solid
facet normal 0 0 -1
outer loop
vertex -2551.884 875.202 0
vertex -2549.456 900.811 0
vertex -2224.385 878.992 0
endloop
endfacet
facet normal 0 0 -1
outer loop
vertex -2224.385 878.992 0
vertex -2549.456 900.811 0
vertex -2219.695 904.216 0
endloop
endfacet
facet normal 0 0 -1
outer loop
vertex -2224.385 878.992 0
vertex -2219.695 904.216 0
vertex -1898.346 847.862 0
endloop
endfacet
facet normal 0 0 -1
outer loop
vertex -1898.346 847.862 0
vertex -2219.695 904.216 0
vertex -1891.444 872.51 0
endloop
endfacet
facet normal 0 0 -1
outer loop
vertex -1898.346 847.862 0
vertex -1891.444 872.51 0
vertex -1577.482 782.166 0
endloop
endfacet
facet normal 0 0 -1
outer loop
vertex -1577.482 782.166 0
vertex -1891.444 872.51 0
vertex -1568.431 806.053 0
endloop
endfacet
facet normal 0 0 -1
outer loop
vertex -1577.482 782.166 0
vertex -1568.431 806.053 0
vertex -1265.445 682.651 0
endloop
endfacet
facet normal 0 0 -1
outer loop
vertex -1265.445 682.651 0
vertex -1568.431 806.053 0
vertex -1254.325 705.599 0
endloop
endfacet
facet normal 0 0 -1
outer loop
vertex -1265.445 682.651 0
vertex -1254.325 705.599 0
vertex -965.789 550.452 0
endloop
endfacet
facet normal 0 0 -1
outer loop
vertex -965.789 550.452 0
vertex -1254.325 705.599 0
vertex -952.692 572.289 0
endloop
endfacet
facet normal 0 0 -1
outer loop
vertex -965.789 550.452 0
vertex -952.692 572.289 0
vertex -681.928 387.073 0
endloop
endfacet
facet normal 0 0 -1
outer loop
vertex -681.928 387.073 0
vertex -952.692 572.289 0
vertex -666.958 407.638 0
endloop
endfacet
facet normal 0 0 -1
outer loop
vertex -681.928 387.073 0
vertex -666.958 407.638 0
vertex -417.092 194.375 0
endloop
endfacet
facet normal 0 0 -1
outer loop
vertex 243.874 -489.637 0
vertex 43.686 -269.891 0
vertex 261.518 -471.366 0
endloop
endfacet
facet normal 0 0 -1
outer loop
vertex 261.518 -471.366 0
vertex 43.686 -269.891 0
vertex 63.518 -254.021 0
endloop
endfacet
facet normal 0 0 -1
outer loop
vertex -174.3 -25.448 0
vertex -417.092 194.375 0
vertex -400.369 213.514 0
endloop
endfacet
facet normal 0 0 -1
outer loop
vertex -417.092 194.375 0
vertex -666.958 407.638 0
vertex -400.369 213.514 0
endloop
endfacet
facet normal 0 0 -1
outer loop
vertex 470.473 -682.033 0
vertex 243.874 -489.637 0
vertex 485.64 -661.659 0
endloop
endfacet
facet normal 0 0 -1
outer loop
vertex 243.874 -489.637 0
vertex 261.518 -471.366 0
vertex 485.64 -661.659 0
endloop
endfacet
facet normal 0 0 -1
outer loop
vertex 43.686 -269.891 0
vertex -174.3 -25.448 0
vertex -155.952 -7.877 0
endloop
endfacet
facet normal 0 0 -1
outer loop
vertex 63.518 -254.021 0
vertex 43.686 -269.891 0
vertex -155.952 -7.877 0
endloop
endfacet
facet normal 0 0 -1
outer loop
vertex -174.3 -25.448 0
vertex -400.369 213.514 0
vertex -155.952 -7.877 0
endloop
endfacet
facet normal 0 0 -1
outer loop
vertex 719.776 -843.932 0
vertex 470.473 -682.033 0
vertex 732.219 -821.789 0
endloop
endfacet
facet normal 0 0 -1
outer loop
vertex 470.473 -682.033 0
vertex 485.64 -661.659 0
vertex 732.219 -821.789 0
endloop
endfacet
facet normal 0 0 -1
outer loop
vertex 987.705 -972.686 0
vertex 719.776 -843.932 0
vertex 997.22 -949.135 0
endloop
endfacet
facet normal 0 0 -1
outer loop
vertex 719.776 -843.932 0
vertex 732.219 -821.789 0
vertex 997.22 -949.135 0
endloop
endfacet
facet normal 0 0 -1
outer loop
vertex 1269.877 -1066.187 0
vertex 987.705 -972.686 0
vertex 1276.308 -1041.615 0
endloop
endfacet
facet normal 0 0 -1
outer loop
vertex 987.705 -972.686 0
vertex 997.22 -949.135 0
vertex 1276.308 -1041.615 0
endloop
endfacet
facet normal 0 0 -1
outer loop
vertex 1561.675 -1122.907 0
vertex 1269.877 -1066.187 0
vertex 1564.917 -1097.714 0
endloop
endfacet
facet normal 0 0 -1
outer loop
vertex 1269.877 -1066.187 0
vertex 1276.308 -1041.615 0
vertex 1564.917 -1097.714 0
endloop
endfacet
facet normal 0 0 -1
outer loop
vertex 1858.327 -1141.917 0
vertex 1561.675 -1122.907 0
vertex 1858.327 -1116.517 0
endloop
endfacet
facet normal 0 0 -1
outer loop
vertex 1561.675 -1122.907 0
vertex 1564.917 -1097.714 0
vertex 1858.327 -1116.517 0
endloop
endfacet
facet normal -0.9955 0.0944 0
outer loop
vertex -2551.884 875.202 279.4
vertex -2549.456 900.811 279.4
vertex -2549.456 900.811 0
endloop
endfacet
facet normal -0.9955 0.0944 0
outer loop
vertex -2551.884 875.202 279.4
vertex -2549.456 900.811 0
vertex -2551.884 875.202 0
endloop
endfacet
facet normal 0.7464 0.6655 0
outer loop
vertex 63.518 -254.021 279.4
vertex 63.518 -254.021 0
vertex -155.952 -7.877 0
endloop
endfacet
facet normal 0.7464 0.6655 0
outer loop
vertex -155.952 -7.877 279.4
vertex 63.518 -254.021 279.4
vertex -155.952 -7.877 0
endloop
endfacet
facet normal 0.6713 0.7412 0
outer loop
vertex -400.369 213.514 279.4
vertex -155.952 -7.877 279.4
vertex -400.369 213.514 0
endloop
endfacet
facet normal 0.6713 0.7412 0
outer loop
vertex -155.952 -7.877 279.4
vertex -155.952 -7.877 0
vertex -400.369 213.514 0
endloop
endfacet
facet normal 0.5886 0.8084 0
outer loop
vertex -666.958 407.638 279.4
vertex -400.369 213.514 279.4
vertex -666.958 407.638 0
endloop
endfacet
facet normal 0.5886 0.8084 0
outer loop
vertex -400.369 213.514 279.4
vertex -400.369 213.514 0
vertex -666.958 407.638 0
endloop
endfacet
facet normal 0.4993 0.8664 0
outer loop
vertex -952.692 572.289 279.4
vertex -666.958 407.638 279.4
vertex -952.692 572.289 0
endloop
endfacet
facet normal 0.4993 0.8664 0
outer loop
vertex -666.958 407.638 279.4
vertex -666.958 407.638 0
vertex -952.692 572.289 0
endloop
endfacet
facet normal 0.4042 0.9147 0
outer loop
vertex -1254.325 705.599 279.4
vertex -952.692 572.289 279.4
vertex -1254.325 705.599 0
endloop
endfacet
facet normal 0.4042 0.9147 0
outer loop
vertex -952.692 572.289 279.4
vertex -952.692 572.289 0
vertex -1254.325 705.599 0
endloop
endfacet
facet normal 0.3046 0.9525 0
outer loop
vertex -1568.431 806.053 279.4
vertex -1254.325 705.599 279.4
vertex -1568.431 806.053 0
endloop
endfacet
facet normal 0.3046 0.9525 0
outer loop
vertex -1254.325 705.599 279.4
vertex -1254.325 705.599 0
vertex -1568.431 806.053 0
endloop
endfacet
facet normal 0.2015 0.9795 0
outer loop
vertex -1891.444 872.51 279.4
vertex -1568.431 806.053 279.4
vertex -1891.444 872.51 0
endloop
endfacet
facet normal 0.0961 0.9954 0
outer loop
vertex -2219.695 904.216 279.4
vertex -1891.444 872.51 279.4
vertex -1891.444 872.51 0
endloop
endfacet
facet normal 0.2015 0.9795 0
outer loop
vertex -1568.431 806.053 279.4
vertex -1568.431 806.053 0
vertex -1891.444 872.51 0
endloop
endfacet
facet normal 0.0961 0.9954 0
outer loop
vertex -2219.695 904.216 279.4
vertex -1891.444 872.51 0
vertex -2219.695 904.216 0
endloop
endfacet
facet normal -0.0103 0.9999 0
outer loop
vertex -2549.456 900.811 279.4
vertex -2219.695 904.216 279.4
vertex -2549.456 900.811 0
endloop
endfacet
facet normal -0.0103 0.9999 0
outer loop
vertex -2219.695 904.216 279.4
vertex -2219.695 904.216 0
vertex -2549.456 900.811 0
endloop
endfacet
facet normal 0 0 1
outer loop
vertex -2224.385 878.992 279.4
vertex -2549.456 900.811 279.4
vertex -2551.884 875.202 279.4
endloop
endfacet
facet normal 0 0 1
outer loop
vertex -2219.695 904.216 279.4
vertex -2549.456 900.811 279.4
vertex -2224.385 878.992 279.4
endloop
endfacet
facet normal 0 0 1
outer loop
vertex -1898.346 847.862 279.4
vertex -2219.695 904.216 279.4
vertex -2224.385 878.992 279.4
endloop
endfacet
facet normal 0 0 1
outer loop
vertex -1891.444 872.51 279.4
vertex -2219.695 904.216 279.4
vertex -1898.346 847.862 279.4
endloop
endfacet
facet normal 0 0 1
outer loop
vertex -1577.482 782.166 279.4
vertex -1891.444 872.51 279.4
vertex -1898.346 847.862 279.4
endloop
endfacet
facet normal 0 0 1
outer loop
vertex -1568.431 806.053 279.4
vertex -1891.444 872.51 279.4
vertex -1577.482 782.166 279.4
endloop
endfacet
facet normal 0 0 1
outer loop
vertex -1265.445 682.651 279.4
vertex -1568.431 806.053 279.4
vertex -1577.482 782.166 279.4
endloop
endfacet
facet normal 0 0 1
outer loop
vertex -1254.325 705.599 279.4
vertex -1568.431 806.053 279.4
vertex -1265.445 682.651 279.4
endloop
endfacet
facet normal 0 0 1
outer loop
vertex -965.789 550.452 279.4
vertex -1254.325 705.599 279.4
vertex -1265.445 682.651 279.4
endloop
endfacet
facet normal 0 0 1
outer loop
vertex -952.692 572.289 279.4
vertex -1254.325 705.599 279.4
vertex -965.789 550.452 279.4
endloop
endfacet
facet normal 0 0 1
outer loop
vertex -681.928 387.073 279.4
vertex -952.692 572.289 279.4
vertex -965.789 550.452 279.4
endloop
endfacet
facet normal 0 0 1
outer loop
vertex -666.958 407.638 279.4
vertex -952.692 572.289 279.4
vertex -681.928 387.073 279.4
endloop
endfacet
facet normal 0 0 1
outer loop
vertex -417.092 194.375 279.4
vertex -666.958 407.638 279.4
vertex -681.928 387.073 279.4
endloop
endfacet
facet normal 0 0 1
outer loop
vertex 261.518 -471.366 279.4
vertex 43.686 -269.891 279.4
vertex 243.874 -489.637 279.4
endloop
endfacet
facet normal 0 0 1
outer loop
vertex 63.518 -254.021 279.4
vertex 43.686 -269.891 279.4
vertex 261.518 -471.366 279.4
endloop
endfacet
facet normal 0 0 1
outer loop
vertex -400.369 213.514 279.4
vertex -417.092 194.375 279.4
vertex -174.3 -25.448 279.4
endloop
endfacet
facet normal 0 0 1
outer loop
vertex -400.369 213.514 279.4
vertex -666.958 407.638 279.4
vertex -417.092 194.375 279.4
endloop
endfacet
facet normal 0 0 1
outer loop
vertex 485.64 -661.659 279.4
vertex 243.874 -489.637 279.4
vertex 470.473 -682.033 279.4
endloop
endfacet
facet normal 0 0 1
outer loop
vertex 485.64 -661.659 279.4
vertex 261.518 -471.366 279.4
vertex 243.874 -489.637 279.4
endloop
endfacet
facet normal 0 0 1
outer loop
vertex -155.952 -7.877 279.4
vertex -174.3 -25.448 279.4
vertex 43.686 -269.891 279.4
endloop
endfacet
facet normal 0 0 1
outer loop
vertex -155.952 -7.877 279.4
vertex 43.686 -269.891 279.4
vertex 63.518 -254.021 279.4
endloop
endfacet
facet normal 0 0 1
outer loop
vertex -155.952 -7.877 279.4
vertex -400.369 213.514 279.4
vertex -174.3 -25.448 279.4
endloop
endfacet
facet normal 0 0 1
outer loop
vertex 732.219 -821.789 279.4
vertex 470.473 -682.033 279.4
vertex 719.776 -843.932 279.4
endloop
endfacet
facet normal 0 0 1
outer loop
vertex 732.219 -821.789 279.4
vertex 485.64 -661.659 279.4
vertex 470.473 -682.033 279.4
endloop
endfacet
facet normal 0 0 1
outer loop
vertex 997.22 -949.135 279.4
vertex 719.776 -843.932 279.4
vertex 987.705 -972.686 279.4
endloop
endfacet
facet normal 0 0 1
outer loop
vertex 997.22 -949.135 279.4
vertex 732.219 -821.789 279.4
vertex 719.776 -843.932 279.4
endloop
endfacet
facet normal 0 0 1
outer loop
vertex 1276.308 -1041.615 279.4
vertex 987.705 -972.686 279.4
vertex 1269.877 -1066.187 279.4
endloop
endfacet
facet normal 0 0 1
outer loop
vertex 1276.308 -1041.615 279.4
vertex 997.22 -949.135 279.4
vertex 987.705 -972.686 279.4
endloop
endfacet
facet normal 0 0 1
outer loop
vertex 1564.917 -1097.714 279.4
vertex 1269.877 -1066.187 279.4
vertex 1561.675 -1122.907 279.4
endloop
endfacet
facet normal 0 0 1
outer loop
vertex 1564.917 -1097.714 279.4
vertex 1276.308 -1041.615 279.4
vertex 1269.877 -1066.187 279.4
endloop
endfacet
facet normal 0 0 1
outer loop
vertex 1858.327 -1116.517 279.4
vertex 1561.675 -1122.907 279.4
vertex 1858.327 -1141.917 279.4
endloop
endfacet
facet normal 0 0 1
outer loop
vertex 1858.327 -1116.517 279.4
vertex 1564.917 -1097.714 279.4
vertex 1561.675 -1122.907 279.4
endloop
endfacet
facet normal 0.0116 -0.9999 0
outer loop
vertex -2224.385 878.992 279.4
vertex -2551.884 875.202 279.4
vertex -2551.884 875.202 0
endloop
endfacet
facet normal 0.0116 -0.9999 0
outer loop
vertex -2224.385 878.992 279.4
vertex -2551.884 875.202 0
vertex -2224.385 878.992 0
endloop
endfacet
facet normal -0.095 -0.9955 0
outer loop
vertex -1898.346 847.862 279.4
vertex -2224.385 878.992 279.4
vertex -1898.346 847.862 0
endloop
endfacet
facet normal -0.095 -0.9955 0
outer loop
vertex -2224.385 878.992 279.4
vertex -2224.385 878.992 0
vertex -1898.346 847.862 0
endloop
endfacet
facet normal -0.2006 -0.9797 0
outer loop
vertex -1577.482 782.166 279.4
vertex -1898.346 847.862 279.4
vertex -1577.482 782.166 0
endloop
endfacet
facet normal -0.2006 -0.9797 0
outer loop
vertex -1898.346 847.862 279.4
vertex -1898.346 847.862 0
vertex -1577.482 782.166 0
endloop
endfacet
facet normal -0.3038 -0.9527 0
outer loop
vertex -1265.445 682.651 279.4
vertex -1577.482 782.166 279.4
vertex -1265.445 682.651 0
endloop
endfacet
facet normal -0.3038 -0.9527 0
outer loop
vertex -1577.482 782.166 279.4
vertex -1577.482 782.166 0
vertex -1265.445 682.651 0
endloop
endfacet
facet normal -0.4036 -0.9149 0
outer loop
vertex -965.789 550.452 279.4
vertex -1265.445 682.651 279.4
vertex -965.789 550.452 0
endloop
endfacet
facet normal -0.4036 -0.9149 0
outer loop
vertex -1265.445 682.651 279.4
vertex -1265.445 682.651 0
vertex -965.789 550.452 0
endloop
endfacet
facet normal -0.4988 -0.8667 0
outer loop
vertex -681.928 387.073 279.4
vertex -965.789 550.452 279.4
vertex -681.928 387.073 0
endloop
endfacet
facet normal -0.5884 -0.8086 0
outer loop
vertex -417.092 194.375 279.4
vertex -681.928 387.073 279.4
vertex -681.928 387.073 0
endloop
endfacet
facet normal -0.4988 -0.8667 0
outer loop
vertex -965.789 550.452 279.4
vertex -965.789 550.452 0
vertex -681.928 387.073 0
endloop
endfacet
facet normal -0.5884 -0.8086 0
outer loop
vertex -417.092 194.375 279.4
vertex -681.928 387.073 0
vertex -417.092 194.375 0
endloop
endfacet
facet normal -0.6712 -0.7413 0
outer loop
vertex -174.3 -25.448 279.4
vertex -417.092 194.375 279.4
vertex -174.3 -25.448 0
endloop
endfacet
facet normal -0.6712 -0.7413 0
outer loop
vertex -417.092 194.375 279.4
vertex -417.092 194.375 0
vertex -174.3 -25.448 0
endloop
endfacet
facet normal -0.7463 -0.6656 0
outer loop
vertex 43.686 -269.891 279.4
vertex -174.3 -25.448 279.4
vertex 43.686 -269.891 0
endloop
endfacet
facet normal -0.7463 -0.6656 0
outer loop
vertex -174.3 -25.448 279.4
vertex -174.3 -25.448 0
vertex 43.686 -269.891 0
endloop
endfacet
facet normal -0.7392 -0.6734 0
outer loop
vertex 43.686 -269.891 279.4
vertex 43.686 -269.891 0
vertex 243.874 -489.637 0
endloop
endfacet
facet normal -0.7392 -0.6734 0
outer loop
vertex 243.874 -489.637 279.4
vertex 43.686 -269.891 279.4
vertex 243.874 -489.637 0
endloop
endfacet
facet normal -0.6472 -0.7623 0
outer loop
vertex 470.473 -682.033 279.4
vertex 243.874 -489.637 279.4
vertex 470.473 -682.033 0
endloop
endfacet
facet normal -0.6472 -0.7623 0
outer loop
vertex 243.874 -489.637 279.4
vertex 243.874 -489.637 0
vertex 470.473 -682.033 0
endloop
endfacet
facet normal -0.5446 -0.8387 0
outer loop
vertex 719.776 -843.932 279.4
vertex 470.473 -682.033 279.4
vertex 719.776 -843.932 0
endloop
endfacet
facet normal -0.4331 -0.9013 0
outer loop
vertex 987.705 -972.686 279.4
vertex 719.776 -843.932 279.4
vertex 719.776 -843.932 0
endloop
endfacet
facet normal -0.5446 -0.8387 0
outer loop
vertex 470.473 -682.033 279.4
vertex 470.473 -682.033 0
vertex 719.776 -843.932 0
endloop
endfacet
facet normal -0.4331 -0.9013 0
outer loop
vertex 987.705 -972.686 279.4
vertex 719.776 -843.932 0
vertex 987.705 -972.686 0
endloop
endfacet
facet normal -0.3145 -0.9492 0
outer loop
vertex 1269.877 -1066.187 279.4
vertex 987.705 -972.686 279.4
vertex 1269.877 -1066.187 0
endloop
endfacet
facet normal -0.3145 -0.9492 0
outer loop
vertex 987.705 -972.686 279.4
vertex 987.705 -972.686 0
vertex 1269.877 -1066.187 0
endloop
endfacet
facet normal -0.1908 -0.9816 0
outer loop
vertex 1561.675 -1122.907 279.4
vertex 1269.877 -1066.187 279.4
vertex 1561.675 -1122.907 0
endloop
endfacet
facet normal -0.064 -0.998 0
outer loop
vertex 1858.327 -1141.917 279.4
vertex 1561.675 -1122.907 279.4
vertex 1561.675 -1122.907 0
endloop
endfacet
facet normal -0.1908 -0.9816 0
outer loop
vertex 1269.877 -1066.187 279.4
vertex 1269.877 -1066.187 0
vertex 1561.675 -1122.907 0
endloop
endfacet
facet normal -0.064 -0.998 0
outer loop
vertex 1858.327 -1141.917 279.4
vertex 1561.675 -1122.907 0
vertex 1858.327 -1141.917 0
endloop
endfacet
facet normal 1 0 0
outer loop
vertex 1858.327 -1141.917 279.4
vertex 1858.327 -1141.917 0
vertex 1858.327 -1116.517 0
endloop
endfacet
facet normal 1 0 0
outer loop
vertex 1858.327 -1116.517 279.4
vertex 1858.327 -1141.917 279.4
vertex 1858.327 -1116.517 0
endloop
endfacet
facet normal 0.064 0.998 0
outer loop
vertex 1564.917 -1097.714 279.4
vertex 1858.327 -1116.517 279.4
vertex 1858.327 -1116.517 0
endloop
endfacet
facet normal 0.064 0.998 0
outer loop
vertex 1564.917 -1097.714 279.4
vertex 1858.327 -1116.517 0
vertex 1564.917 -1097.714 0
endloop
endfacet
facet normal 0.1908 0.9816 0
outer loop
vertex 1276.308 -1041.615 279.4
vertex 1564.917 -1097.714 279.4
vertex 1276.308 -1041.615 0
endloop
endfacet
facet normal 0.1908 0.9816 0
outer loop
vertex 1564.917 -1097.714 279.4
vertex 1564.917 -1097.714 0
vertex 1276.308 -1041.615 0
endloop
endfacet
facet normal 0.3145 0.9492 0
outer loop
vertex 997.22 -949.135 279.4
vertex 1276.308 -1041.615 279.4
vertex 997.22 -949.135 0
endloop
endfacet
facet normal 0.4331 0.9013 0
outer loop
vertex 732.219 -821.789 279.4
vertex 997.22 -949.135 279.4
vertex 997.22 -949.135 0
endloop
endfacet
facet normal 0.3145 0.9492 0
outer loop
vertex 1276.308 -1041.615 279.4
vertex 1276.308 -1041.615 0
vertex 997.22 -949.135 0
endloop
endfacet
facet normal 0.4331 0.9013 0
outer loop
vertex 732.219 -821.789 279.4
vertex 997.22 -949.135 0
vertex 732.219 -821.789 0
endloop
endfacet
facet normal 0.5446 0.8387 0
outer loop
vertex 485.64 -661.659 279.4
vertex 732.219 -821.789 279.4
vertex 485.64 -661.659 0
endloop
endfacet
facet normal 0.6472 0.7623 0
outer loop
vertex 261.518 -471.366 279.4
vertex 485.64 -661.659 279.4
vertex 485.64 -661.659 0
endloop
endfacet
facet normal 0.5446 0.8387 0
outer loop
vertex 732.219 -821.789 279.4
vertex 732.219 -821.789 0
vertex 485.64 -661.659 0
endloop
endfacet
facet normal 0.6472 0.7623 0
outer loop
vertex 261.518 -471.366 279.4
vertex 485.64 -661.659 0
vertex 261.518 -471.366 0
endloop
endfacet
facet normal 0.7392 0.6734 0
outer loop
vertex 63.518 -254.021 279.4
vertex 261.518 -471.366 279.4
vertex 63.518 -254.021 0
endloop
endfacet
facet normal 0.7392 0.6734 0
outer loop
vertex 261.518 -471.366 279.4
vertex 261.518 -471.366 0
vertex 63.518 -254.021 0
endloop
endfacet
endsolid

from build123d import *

# Parameters (mm, degrees)
F1_DEPTH = 279.4


with BuildPart() as f1:
    # F0 (on Top) → F1 (new body)
    with BuildSketch(Plane.XY):
        with BuildLine():
            Line((214.9397816719, -461.2037903767), (232.900293914, -443.2432781346))
            ThreePointArc((232.900293914, -443.2432781346), (145.5939633483, -350.9732813972), (63.5179117588, -254.0213891504))
            ThreePointArc((63.5179117588, -254.0213891504), (-1101.7312539149, 642.9652273287), (-2549.4558180108, 900.8105196245))
            Line((-2549.4558180108, 900.8105196245), (-2551.8841937865, 875.2015777751))
            ThreePointArc((-2551.8841937865, 875.2015777751), (-1113.8523404134, 620.5514371442), (43.6857709845, -269.8910517905))
            ThreePointArc((43.6857709845, -269.8910517905), (126.6687402713, -367.9142356644), (214.9397816719, -461.2037903768))
        make_face()
        with BuildLine():
            Line((1858.3266518276, -1141.9169202211), (1858.3266518276, -1116.5169202211))
            ThreePointArc((1858.3266518276, -1116.5169202211), (978.6522458499, -941.5388016048), (232.900293914, -443.2432781346))
            Line((232.900293914, -443.2432781346), (214.9397816719, -461.2037903767))
            ThreePointArc((214.9397816719, -461.2037903768), (968.9320866679, -965.0053417306), (1858.3266518276, -1141.9169202211))
        make_face()
    extrude(amount=F1_DEPTH)


solid = f1.part
